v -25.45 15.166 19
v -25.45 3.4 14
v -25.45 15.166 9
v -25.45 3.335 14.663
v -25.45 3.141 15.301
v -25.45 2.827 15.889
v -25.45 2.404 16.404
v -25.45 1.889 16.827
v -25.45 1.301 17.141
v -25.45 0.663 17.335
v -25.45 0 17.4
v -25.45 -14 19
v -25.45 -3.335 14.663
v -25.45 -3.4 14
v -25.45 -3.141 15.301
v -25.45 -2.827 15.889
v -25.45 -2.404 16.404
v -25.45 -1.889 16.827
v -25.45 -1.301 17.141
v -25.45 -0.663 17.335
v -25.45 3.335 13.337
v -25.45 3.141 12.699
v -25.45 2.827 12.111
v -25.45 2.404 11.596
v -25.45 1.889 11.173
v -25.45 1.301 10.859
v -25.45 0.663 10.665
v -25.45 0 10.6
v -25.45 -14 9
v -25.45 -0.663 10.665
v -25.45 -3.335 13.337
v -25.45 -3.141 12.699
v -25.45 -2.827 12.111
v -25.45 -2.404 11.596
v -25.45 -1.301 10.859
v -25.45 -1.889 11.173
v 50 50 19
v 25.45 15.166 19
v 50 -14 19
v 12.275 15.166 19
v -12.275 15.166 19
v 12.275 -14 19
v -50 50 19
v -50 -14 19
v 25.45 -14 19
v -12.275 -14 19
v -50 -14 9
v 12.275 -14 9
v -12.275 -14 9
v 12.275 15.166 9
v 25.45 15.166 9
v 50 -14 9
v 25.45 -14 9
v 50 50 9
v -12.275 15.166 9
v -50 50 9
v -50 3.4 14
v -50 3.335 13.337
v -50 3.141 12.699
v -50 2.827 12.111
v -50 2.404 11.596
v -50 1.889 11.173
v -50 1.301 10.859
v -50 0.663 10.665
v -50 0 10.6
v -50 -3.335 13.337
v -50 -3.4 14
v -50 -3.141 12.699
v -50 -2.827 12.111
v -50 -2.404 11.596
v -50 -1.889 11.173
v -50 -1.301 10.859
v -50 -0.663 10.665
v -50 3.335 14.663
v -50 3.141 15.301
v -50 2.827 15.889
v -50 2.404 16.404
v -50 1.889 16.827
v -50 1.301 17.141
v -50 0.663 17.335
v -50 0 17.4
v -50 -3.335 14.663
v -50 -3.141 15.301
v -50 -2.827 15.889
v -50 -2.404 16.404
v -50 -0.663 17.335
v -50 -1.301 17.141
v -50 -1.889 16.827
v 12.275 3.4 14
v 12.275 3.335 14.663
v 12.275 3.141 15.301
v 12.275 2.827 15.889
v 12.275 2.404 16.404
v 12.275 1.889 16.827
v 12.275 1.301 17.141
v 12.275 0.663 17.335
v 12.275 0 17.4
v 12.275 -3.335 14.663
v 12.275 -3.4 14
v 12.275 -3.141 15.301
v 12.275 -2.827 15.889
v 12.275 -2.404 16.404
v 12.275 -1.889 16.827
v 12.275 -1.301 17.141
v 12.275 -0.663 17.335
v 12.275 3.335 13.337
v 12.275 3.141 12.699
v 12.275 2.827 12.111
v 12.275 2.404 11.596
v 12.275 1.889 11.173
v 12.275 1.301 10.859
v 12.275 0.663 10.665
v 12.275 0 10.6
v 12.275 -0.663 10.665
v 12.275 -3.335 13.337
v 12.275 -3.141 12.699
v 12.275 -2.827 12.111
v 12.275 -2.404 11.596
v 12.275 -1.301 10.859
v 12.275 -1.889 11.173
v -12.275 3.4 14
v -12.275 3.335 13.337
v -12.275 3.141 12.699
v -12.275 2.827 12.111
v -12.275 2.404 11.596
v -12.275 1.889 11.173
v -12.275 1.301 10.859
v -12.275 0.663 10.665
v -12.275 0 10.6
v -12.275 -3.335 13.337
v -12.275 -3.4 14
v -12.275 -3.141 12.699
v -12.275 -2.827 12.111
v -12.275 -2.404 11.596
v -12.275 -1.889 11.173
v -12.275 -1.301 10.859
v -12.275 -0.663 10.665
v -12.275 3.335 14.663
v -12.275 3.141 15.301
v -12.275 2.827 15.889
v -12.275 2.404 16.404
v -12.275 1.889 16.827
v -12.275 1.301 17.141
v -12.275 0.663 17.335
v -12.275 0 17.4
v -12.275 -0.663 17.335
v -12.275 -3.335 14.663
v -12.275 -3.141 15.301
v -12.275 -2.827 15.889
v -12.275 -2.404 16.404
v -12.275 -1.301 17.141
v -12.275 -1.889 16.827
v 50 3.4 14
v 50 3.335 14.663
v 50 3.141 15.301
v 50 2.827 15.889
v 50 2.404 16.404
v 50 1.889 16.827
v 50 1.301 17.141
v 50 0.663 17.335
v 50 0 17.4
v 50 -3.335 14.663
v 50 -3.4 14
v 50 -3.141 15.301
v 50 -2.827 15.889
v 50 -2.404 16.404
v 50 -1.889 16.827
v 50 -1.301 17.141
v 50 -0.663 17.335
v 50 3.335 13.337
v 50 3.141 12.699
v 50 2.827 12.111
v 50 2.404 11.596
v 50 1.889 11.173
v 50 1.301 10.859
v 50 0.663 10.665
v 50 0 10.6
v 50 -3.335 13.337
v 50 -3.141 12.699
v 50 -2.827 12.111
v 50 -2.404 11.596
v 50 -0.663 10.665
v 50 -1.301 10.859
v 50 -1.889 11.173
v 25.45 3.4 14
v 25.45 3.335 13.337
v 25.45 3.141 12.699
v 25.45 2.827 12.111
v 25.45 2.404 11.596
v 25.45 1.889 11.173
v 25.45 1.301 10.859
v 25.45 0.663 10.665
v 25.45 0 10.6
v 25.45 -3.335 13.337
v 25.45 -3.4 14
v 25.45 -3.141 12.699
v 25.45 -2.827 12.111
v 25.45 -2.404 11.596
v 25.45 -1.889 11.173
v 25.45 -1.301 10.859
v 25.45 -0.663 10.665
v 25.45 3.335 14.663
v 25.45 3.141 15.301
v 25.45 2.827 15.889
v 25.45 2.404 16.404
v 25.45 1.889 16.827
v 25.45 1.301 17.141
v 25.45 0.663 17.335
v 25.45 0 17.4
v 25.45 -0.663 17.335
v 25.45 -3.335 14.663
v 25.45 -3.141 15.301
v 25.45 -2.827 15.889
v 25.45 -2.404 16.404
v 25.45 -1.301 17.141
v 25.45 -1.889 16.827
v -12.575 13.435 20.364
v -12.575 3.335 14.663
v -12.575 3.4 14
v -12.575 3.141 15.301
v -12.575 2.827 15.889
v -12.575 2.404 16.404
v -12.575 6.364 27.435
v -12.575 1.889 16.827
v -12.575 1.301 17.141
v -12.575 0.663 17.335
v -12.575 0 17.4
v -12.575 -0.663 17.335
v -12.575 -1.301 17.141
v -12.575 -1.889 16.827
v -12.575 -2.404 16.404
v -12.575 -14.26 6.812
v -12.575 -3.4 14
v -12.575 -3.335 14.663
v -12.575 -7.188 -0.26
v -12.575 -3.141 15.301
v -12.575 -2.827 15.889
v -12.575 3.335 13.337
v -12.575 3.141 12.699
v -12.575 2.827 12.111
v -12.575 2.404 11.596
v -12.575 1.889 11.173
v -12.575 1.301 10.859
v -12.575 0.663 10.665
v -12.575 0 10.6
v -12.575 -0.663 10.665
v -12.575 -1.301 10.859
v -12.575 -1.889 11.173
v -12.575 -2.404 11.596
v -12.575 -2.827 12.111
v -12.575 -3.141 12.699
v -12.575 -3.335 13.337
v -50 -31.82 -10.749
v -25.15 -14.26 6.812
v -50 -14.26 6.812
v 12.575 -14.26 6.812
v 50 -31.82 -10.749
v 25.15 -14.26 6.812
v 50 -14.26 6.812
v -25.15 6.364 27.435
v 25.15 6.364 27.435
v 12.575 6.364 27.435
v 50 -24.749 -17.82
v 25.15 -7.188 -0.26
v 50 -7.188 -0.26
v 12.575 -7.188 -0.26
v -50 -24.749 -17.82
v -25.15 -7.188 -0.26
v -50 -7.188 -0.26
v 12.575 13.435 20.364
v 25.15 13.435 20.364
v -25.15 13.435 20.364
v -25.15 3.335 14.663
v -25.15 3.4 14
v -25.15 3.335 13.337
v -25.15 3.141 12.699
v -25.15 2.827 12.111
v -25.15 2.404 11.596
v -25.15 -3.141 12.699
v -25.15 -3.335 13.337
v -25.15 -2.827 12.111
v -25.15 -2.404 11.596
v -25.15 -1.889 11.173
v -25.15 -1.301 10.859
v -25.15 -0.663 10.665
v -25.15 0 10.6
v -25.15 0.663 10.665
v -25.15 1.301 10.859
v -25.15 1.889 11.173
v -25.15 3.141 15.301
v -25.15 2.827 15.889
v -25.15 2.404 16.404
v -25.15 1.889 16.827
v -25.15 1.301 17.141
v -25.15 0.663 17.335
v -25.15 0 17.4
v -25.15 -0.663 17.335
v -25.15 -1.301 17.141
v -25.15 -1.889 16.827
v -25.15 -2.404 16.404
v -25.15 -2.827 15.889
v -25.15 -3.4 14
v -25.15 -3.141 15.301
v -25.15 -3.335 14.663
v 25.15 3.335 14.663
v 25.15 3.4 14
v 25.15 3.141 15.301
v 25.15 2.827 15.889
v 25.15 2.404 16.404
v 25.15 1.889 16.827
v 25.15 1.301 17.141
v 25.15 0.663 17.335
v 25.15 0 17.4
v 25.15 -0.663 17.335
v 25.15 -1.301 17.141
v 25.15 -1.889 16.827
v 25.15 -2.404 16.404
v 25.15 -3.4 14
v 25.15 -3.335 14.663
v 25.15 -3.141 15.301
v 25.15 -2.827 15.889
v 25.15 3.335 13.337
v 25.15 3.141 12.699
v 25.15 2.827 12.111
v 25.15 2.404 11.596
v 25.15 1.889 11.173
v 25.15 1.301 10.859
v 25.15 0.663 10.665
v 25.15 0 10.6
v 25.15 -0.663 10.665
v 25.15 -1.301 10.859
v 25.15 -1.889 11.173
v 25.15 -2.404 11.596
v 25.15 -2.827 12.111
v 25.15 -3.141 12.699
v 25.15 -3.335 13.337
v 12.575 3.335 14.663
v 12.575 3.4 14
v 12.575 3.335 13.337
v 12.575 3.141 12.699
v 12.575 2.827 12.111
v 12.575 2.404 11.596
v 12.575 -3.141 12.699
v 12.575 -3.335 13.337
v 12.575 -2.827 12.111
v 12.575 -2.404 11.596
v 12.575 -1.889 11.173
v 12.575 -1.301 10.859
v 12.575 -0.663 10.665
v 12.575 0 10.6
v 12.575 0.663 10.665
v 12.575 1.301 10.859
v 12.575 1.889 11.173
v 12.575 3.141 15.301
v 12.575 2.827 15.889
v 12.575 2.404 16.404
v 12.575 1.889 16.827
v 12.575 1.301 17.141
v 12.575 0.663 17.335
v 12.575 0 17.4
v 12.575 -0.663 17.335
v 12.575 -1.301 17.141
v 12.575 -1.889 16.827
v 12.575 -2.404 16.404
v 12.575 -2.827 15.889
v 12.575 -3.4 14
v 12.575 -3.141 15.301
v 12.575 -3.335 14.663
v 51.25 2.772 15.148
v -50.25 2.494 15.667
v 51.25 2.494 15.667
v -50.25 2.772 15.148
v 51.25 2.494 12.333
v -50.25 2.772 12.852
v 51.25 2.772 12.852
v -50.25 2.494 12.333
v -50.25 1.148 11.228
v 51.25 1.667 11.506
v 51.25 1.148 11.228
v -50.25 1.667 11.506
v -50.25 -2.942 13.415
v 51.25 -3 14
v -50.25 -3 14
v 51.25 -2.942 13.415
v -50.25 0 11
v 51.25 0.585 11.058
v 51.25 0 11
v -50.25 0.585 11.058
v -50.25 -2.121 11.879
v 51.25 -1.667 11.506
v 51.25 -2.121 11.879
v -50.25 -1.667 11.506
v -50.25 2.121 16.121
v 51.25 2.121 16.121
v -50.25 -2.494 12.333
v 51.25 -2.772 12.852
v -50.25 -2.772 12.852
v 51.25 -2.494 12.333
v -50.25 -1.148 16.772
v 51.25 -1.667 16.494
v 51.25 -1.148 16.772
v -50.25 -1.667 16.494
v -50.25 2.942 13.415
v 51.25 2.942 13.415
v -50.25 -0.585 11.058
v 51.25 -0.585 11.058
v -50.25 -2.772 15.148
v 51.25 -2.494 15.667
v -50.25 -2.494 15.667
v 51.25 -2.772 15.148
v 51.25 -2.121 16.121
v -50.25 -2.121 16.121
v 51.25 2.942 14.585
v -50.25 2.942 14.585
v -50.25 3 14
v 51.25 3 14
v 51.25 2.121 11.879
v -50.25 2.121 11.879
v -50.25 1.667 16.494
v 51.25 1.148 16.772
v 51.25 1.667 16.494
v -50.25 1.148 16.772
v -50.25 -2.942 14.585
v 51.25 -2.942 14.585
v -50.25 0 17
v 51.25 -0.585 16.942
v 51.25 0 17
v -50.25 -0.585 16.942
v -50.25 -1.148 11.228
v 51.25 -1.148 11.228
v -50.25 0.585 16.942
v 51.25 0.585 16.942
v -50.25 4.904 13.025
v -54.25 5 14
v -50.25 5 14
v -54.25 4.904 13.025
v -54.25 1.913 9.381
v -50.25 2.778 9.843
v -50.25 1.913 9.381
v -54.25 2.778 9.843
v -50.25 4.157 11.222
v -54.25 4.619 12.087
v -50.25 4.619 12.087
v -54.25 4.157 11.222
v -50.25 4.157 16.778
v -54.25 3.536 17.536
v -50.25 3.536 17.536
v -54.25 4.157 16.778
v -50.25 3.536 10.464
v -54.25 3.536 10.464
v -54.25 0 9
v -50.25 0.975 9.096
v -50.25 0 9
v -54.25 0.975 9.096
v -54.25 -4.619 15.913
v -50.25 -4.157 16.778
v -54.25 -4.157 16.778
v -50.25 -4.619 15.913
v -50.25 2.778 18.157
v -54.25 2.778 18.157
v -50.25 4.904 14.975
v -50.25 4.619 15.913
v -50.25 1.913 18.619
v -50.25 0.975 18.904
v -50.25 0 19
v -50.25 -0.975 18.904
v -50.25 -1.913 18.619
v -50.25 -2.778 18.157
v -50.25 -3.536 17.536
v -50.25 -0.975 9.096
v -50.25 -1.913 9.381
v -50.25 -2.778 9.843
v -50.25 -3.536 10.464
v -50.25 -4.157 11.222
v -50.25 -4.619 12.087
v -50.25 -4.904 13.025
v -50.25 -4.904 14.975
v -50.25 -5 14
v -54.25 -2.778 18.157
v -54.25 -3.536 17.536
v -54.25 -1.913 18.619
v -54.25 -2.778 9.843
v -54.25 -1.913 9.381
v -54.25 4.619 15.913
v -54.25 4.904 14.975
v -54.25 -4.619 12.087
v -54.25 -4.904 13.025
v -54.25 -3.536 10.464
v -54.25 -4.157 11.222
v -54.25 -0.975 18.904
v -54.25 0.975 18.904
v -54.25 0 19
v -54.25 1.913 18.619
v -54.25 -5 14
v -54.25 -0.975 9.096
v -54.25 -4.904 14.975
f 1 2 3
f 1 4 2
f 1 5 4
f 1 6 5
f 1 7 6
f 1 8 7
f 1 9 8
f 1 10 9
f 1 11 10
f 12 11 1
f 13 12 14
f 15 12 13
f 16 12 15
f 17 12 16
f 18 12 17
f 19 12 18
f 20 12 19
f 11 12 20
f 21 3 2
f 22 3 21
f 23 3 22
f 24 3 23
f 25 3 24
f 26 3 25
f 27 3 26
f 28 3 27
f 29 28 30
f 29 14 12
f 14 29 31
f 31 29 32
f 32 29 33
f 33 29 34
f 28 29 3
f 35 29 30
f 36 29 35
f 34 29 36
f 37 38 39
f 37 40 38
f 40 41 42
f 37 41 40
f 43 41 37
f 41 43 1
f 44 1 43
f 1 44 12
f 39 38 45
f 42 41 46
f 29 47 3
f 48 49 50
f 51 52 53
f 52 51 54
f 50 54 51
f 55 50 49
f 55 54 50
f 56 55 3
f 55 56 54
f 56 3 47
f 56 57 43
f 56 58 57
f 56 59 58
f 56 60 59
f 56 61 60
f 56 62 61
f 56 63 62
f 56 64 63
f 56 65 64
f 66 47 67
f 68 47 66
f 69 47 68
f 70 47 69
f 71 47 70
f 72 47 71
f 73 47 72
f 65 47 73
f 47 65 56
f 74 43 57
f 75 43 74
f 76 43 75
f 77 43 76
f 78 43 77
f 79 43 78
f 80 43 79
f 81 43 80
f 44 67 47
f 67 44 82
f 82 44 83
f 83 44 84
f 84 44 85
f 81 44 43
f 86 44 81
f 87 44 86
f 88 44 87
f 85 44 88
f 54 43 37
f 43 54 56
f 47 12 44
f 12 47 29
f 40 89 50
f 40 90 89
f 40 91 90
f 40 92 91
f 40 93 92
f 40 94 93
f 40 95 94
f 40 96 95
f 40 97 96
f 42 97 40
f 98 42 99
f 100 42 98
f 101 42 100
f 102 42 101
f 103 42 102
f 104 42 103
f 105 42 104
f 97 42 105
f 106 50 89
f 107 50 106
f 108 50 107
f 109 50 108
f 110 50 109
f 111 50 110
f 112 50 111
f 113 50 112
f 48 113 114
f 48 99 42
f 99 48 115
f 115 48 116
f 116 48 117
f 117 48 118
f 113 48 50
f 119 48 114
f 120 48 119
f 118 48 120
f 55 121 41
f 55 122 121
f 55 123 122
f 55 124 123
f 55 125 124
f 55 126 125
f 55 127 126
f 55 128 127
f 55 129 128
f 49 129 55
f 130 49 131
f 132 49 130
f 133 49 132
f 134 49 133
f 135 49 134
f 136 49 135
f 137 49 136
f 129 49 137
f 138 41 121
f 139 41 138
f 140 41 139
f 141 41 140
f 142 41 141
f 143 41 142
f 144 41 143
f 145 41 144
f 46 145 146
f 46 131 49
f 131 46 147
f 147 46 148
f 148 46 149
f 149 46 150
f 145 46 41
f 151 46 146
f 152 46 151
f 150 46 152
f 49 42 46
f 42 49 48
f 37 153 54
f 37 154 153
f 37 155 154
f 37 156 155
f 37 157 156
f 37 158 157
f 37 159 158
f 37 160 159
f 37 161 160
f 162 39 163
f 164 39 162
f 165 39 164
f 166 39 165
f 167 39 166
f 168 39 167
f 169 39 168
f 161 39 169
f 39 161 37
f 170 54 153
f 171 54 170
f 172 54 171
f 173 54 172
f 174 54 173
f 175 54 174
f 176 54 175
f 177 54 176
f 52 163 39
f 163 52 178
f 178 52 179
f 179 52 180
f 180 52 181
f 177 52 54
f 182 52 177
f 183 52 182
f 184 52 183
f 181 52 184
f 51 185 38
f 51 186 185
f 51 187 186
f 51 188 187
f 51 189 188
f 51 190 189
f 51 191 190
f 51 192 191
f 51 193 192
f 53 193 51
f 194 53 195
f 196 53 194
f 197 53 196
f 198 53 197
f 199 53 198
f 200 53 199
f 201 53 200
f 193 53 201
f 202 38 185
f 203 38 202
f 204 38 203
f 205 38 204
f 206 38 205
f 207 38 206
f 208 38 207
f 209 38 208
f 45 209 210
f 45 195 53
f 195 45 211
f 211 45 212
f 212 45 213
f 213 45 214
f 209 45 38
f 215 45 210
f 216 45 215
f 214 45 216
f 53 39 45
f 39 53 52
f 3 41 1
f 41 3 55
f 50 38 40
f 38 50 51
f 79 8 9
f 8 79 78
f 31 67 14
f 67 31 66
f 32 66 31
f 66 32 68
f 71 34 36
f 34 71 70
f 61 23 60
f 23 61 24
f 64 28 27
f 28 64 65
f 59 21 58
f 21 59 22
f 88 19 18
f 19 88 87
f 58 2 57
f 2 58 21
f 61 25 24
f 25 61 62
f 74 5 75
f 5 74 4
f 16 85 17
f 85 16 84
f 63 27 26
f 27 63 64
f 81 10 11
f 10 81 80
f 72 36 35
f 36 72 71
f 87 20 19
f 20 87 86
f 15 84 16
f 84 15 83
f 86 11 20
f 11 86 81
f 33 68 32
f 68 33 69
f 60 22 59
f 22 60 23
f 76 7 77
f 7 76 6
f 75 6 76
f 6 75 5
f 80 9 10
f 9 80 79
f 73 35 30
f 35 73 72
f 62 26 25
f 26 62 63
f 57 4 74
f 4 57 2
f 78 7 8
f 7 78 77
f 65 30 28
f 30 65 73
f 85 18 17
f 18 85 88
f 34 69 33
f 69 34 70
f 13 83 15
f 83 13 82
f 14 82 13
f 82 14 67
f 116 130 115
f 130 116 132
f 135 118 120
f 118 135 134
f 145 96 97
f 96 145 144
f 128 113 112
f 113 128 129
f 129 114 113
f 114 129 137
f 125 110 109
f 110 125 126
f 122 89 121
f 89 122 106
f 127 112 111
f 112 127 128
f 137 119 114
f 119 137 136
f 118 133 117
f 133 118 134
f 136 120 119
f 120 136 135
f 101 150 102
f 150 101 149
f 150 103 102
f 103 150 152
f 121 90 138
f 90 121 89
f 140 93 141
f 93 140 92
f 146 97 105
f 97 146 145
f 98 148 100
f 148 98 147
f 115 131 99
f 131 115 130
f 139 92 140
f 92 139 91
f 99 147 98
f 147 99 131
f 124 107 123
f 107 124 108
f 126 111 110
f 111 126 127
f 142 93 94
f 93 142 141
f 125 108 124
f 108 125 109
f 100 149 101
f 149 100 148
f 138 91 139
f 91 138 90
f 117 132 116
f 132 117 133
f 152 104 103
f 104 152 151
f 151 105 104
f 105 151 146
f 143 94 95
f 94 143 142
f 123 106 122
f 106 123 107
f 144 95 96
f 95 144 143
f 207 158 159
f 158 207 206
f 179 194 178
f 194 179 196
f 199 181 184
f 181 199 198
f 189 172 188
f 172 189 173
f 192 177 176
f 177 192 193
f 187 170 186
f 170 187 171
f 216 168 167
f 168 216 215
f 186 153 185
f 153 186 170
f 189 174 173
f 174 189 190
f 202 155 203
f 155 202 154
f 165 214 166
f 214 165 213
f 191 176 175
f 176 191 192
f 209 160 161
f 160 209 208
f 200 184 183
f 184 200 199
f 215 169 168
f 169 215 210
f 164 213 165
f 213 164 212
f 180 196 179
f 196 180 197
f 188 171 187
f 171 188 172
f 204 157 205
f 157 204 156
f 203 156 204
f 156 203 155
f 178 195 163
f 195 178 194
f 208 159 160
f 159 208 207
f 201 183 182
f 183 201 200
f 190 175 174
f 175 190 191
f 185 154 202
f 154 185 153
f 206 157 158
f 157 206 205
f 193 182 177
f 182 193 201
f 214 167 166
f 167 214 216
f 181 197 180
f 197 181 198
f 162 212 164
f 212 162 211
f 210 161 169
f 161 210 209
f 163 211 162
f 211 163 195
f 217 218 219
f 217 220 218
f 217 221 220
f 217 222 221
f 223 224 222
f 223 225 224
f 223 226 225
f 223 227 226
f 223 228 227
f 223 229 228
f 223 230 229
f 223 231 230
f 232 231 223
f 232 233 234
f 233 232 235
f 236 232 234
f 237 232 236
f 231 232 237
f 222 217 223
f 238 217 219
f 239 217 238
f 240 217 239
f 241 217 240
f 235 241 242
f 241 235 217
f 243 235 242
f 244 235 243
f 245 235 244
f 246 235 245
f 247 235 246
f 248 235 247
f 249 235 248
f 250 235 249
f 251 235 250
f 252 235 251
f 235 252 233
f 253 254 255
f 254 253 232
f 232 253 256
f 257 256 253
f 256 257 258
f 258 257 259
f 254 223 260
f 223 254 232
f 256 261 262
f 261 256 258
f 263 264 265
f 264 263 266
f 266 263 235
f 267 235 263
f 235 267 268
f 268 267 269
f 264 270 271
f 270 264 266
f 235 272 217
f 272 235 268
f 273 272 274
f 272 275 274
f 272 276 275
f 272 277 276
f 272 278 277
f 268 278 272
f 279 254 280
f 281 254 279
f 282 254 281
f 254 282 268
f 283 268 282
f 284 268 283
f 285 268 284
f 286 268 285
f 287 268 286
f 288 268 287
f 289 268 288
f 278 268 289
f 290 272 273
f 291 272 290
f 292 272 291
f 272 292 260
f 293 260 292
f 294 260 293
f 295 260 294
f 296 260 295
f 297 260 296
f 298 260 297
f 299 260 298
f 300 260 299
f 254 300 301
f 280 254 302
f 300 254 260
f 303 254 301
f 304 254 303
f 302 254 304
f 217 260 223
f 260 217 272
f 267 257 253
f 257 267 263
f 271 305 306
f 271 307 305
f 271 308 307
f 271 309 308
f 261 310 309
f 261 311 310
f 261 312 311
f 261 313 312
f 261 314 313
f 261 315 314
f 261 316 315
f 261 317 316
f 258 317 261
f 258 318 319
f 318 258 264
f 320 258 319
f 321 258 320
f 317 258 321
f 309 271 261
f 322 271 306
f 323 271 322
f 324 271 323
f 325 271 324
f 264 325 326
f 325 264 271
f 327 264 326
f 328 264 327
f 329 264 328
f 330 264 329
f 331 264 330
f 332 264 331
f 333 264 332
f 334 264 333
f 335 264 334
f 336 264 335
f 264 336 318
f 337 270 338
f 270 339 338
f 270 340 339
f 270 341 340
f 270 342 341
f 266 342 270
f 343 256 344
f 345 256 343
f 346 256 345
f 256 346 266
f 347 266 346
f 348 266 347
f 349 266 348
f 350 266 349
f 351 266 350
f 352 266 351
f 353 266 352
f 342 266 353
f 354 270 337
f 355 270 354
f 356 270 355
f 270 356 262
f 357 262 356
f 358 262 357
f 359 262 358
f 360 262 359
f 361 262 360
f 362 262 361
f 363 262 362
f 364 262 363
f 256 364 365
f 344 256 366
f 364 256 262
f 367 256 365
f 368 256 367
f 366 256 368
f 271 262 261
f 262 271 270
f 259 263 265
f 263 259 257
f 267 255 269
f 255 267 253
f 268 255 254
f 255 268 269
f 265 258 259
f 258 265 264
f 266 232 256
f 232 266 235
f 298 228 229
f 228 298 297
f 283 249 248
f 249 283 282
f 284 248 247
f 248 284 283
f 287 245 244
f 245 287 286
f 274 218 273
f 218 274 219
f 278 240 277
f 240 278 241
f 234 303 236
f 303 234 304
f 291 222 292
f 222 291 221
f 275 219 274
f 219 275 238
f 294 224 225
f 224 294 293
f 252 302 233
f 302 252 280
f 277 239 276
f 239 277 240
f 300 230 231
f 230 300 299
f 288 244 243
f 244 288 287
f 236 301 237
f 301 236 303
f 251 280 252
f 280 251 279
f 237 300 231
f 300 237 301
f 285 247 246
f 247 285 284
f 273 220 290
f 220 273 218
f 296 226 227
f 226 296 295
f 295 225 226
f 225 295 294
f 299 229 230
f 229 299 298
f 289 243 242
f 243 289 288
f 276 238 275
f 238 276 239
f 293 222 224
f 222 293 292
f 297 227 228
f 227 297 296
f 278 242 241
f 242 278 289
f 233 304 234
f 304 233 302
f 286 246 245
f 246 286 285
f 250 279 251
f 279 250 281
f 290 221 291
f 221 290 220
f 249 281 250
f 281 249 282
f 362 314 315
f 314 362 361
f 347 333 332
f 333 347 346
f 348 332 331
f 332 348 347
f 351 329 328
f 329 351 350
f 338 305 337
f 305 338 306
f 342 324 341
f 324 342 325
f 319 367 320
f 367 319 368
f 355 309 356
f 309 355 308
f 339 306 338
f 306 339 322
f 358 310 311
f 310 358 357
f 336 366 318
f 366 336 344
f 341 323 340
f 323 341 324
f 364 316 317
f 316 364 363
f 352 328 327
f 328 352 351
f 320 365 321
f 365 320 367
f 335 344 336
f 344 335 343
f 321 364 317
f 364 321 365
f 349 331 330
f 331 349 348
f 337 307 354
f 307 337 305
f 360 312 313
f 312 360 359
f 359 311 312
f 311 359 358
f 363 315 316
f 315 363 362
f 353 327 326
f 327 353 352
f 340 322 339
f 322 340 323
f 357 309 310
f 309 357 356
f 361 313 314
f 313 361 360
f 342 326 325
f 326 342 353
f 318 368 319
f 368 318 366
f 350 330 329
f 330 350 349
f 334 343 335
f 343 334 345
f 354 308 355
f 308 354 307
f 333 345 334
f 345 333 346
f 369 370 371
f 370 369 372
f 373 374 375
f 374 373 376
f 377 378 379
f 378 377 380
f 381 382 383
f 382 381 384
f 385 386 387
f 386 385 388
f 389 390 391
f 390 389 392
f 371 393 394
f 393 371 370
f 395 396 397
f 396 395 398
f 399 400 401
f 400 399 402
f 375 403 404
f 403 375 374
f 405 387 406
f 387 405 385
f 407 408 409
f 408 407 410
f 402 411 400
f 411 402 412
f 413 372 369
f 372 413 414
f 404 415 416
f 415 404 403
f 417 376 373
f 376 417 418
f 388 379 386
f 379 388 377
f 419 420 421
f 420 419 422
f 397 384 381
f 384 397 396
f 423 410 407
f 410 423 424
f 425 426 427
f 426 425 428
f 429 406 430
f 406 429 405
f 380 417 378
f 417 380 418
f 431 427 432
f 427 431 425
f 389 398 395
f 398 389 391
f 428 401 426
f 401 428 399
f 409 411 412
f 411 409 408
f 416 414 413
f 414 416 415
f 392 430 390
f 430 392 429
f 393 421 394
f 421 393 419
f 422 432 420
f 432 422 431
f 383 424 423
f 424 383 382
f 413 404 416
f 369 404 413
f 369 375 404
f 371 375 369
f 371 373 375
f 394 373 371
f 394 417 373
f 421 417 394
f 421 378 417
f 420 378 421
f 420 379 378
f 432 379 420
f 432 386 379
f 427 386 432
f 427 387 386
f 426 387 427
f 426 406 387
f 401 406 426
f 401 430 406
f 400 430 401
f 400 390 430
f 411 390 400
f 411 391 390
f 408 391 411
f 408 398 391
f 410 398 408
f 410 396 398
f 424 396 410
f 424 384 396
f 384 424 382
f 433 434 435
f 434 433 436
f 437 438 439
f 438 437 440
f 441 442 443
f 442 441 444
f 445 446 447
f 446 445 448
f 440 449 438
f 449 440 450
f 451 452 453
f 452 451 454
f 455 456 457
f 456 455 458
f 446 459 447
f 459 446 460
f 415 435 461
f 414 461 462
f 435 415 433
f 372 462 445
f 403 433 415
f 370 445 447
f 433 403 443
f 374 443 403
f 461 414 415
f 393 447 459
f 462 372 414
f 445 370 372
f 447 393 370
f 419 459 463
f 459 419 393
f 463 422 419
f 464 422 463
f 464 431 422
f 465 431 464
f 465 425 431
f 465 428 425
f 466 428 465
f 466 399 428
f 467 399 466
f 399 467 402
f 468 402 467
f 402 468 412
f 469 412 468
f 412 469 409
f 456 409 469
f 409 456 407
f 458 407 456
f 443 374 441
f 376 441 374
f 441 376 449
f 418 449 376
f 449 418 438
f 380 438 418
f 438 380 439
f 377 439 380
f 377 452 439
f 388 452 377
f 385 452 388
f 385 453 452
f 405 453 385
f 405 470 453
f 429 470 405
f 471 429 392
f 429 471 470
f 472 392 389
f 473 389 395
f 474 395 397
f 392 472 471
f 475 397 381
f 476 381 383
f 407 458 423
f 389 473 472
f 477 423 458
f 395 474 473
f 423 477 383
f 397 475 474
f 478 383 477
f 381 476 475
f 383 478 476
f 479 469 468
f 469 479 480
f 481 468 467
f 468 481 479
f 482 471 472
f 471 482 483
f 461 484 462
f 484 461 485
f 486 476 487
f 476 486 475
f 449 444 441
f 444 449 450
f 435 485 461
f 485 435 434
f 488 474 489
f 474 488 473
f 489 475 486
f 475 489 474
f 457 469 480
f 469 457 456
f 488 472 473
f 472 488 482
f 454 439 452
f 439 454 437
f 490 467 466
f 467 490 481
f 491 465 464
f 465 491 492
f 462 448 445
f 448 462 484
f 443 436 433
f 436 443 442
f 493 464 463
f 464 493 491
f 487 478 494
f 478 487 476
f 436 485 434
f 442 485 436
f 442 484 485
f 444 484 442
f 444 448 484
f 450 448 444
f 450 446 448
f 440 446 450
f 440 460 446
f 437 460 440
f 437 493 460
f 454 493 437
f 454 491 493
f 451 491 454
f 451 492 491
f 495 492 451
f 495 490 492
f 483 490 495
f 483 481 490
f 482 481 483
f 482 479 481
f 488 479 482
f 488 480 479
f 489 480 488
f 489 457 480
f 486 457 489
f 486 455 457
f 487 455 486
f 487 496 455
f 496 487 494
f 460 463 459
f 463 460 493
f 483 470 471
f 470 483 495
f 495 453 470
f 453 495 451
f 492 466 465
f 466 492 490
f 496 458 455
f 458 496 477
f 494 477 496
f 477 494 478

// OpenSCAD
$fn = 32;

// ------------------------------------------------------------------------
// Butt hinge: hinge 100 mm, leaf swung 45 deg
// Every part is its own module, assembly() places every instance.
// ------------------------------------------------------------------------

// --- part 1 ---
module hinge_base() {
  difference() {
    union() {
      translate([-50, -14, -5]) cube([24.55, 64, 10]);
      translate([-12.275, -14, -5]) cube([24.55, 64, 10]);
      translate([25.45, -14, -5]) cube([24.55, 64, 10]);
      translate([-50, 15.166, -5]) cube([100, 34.834, 10]);
    }
    translate([-37.725, 0, 0]) rotate([0, 90, 0]) cylinder(h = 26.55, d = 6.8, center = true);
    translate([0, 0, 0]) rotate([0, 90, 0]) cylinder(h = 26.55, d = 6.8, center = true);
    translate([37.725, 0, 0]) rotate([0, 90, 0]) cylinder(h = 26.55, d = 6.8, center = true);
  }
}

// --- part 2 ---
module hinge_mover() {
  difference() {
    union() {
      translate([-25.15, -40, -5]) cube([12.575, 54, 10]);
      translate([12.575, -40, -5]) cube([12.575, 54, 10]);
      translate([-50, -40, -5]) cube([100, 24.834, 10]);
    }
    translate([-18.863, 0, 0]) rotate([0, 90, 0]) cylinder(h = 14.575, d = 6.8, center = true);
    translate([18.863, 0, 0]) rotate([0, 90, 0]) cylinder(h = 14.575, d = 6.8, center = true);
  }
}

// --- part 3 ---
module hinge_pin() {
  rotate([0, 90, 0]) cylinder(h = 102.5, d = 6, center = true);
  translate([-54.25, 0, 0]) rotate([0, 90, 0]) cylinder(h = 4, d = 10);
}

// --- assembly ---
module assembly() {
  color([0.80, 0.24, 0.20]) translate([0, 0, 14]) rotate([0, 0, 0]) hinge_base();
  color([0.20, 0.45, 0.75]) translate([0, 0, 14]) rotate([45, 0, 0]) hinge_mover();
  color([0.25, 0.62, 0.32]) translate([0, 0, 14]) rotate([0, 0, 0]) hinge_pin();
}

assembly();
